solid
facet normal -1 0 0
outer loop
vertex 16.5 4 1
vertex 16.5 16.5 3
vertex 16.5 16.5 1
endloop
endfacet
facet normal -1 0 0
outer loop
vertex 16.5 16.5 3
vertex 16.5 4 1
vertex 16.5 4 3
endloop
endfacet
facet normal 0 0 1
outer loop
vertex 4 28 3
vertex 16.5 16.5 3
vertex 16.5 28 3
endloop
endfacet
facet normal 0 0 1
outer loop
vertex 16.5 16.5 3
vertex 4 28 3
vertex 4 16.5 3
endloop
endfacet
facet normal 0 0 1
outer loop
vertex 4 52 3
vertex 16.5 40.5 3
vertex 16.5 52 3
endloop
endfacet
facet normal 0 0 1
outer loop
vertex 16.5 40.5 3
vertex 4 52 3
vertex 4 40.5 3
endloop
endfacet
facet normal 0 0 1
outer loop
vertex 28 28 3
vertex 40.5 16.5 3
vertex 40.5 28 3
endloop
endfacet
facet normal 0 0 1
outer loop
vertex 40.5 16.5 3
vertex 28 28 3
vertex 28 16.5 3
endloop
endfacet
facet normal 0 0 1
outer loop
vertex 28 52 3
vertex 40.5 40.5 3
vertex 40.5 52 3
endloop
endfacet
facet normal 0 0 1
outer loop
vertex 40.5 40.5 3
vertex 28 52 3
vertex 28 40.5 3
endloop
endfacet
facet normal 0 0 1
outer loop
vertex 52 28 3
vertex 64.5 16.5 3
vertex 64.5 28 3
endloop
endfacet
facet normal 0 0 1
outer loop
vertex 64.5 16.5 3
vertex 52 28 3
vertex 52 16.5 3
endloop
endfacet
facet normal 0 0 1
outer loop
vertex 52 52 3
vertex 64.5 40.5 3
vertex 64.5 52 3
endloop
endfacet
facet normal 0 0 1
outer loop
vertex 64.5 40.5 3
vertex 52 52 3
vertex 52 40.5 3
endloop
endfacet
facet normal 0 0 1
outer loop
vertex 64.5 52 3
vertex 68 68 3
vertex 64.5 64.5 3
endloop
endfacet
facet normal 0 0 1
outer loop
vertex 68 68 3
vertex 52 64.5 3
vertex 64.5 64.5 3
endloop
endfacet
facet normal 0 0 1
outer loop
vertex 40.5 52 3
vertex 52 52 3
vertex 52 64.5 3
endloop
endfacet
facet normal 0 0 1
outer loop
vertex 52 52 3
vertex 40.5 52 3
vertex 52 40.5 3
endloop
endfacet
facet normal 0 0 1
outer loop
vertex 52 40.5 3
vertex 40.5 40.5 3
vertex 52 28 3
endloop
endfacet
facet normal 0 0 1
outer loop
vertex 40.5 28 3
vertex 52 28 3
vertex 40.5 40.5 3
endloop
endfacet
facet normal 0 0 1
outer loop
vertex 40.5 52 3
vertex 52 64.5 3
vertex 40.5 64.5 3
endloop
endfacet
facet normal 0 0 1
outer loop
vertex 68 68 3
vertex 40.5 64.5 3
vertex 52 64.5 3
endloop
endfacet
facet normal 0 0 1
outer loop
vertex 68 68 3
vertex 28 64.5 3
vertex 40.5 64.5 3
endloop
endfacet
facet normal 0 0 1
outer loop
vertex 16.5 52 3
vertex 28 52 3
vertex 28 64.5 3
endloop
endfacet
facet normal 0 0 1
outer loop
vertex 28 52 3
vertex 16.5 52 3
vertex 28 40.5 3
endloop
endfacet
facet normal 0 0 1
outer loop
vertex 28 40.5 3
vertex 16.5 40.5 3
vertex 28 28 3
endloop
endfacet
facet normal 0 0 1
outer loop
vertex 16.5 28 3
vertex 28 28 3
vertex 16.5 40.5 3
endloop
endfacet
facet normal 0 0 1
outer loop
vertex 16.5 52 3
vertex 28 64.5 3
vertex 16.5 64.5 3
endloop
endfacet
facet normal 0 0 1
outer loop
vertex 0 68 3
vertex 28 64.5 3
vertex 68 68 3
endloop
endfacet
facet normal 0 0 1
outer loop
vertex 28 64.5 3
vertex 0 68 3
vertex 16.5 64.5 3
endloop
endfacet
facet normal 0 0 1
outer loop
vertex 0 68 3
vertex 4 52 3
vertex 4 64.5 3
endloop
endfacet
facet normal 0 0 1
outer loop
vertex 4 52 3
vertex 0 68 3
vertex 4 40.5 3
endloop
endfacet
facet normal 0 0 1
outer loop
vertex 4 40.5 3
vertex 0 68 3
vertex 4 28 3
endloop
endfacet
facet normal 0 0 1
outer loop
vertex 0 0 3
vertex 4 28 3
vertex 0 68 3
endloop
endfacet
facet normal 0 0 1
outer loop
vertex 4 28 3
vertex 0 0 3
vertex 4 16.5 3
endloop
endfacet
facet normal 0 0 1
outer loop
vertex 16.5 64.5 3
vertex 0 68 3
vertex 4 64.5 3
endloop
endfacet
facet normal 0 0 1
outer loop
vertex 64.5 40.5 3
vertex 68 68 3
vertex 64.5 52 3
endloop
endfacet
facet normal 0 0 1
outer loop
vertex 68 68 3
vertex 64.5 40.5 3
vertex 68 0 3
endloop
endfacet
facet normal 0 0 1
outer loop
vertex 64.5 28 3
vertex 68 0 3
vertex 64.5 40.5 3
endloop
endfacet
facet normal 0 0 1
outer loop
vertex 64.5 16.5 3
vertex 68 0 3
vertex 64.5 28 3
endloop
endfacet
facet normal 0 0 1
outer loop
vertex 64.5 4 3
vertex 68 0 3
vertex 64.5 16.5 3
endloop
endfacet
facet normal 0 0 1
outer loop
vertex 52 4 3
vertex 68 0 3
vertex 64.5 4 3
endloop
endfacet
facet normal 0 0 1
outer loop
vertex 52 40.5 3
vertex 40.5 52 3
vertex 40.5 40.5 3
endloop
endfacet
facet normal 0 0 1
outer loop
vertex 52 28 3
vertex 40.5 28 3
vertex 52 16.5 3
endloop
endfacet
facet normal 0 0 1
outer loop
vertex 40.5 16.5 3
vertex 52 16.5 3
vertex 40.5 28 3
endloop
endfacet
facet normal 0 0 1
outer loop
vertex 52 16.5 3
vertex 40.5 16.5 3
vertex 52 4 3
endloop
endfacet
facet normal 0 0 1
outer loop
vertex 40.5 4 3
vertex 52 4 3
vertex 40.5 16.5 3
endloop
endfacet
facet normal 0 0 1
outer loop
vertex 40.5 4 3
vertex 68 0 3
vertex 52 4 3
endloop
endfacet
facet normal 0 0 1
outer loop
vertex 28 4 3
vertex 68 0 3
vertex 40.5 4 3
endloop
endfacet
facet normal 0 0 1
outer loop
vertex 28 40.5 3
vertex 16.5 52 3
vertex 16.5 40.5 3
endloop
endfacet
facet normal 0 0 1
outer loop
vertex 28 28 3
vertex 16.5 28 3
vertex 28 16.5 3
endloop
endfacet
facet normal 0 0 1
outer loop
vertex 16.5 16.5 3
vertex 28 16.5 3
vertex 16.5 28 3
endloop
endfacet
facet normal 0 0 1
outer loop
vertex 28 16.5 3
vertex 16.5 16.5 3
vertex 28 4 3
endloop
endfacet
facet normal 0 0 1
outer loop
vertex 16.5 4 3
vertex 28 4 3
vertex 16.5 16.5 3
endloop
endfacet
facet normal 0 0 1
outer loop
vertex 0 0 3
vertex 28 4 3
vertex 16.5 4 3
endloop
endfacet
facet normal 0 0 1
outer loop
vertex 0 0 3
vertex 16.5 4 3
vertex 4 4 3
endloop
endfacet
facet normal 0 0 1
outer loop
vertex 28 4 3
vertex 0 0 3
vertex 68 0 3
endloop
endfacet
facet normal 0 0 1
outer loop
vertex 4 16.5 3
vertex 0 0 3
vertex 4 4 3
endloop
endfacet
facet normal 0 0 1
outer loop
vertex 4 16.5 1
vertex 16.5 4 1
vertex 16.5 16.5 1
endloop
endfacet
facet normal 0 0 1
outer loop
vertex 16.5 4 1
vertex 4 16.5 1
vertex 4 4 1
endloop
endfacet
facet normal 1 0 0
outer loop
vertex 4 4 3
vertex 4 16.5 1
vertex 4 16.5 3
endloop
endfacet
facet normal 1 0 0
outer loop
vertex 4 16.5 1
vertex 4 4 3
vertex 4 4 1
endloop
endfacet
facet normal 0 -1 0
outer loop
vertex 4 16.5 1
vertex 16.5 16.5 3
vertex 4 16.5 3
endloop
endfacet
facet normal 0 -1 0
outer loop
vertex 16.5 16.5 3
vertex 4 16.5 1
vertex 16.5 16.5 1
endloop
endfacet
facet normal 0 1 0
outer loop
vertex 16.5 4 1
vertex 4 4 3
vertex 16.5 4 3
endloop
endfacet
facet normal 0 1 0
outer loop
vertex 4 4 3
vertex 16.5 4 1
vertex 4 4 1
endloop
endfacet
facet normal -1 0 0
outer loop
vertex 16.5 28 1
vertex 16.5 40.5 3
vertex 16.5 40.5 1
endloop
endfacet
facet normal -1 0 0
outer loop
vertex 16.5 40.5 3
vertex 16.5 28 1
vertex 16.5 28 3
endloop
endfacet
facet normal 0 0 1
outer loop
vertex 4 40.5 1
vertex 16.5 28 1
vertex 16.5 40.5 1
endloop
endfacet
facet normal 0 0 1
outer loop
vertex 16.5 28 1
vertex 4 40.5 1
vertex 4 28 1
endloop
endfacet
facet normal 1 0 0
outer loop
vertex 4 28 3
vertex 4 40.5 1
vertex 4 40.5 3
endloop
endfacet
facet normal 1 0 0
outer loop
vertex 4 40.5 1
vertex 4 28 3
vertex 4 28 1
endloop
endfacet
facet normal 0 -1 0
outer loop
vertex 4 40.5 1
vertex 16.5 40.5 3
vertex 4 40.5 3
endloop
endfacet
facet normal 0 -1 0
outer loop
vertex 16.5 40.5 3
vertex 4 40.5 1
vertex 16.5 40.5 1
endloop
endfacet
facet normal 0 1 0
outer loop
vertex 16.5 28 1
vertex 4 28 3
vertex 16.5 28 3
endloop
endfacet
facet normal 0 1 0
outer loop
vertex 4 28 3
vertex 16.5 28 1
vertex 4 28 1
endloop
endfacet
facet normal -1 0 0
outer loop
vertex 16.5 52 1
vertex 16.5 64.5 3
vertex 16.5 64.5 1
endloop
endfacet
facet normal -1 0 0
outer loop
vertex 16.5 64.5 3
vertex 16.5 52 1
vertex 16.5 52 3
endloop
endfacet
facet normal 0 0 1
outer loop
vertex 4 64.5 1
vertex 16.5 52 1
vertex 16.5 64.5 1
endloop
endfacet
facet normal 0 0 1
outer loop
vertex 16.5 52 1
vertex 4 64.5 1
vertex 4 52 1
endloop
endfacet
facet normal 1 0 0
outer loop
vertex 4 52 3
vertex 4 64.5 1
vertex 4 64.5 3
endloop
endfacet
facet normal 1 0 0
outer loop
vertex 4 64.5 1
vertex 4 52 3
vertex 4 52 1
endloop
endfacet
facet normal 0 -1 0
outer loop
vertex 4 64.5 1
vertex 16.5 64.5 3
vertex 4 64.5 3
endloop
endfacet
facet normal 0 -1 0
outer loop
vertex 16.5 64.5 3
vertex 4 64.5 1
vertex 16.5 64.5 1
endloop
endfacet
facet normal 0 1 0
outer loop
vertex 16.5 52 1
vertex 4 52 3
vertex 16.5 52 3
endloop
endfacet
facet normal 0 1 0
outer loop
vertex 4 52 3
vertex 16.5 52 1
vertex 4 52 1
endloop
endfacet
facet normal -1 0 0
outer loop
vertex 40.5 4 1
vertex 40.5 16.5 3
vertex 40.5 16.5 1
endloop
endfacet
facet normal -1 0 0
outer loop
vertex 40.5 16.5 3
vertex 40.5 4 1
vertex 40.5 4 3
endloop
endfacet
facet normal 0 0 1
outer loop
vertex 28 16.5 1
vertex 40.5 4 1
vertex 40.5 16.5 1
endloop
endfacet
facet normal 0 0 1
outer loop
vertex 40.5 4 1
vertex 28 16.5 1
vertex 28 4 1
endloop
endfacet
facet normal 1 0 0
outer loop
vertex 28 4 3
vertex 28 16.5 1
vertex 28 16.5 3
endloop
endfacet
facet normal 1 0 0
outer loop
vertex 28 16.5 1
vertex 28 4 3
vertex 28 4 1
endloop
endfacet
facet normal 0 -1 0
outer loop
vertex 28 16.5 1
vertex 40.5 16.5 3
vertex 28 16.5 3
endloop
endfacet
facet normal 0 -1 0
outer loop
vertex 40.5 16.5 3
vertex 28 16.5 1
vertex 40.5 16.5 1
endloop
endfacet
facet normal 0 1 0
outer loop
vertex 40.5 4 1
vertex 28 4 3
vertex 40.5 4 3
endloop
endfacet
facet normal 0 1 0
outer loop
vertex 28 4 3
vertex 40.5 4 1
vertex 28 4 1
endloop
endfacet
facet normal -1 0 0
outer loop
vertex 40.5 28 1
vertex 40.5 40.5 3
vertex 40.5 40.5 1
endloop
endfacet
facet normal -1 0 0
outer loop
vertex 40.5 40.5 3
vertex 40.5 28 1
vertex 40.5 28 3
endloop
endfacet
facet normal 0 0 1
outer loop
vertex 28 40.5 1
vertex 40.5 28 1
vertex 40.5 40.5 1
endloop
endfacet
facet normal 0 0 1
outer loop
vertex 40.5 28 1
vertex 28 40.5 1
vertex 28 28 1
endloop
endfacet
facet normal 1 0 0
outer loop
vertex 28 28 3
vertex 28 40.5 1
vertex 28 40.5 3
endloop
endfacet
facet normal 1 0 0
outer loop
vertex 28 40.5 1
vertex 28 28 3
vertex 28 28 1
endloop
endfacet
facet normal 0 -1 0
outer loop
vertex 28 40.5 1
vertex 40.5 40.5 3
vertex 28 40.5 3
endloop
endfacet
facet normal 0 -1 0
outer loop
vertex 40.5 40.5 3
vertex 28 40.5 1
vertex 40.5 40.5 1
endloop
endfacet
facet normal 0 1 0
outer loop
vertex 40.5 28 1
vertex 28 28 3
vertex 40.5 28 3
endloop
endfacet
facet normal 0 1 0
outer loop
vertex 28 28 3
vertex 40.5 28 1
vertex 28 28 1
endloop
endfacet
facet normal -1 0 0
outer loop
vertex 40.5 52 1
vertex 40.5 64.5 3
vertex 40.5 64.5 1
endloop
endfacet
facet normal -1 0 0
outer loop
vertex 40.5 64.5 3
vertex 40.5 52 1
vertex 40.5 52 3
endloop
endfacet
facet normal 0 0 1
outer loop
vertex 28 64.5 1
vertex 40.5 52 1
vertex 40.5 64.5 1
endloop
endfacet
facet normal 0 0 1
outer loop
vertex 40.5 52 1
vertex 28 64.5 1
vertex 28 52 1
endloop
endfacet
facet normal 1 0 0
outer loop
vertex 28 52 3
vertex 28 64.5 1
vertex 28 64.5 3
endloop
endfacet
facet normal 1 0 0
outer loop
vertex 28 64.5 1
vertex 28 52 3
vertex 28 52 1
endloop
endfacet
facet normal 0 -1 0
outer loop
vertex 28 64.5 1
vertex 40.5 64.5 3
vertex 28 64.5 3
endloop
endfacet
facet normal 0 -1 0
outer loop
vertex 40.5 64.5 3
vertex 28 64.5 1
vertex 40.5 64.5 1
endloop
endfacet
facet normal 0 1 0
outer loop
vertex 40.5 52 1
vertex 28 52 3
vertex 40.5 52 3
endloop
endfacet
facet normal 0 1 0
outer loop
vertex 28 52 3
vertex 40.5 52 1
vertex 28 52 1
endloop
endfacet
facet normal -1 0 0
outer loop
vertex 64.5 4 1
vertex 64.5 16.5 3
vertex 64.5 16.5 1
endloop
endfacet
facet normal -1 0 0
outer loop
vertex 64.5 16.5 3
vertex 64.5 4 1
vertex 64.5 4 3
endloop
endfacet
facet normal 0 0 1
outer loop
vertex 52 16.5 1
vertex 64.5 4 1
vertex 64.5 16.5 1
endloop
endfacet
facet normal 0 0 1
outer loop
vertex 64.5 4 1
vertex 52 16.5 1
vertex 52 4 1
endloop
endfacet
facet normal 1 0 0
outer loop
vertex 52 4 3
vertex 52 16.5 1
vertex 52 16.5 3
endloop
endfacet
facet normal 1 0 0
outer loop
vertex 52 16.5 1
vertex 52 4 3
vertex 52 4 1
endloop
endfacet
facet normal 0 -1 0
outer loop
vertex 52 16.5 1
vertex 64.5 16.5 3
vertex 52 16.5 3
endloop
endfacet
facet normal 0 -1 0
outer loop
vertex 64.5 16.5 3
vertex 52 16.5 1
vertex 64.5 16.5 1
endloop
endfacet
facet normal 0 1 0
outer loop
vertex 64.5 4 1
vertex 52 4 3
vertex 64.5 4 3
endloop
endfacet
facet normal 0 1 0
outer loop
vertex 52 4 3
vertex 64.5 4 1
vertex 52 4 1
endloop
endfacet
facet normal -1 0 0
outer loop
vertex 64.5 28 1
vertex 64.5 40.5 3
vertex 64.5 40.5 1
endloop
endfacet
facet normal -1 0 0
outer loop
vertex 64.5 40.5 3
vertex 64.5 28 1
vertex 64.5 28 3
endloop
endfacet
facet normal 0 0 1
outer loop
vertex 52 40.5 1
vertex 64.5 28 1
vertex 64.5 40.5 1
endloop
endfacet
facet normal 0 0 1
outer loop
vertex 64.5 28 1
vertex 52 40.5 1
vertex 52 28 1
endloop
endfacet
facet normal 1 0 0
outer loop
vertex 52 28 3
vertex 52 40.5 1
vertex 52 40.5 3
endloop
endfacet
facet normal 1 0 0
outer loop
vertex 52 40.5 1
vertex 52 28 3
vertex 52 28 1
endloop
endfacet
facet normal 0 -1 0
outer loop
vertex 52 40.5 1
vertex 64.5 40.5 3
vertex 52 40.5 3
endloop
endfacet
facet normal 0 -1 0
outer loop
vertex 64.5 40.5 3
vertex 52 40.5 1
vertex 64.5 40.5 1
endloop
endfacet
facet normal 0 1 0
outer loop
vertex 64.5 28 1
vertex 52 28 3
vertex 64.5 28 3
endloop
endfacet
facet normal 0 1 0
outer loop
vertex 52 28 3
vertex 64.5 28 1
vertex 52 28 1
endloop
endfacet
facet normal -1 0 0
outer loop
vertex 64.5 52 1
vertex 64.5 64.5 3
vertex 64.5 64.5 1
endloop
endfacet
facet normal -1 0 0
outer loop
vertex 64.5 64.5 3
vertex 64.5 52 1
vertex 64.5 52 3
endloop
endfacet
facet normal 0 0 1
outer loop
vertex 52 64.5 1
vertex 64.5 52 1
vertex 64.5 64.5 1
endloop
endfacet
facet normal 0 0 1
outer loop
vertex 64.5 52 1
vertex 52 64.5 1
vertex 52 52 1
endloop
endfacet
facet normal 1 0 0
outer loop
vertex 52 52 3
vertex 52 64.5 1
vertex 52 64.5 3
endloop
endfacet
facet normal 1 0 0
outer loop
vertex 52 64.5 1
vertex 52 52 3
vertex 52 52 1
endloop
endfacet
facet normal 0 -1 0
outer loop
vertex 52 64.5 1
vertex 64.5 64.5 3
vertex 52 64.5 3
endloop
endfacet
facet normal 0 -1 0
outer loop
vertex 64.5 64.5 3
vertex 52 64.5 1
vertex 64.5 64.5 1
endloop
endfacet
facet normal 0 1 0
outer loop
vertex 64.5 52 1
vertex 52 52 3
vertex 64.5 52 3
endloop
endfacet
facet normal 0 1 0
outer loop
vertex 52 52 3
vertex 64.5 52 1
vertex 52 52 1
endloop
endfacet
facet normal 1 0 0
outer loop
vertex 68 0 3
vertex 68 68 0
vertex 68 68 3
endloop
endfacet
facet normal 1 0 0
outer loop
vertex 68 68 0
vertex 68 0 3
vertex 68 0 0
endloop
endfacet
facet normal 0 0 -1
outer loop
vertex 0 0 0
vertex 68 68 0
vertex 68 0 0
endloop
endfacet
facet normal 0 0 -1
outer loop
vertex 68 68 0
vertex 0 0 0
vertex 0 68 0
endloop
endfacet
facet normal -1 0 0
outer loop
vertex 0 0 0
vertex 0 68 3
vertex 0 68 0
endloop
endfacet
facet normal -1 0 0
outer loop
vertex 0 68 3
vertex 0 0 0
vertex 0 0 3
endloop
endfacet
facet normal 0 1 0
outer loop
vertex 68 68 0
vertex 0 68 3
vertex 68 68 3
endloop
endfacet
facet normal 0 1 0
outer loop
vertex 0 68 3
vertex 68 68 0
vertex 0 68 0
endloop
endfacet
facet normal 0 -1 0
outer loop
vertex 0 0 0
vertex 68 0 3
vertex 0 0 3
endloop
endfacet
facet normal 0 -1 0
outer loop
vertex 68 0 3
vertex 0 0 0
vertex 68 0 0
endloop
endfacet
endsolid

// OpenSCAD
module base(die_size, rows, columns) {
    cube([(die_size * rows) + (die_size * (rows - 1)) + ((die_size / 3) * 2),
          (die_size * columns) + (die_size * (columns - 1)) + ((die_size / 3) * 2),
          die_size / 4]);
}

module depressions(die_size, rows, columns) {
    for (row=[0:2:(rows - 1) * 2]) {
        for (column=[0:2:(columns - 1) * 2]) {
            translate([(row * die_size) + (die_size / 3),
                       (column * die_size) + (die_size / 3),
                       (die_size / 4) - (1 + 1)]) {
                cube([die_size + 0.5, die_size + 0.5, 1 + 1]);
            }
        }
    }
}

module gameboard(die_size, rows, columns) {
    difference() {
        // The pad.
        base(die_size, rows, columns);
        // Rows and columns of dice outlines.
        depressions(die_size, rows, columns);
    }
}
    
die_size = 12;
rows = 3;
columns = 3;

gameboard(die_size, rows, columns);
